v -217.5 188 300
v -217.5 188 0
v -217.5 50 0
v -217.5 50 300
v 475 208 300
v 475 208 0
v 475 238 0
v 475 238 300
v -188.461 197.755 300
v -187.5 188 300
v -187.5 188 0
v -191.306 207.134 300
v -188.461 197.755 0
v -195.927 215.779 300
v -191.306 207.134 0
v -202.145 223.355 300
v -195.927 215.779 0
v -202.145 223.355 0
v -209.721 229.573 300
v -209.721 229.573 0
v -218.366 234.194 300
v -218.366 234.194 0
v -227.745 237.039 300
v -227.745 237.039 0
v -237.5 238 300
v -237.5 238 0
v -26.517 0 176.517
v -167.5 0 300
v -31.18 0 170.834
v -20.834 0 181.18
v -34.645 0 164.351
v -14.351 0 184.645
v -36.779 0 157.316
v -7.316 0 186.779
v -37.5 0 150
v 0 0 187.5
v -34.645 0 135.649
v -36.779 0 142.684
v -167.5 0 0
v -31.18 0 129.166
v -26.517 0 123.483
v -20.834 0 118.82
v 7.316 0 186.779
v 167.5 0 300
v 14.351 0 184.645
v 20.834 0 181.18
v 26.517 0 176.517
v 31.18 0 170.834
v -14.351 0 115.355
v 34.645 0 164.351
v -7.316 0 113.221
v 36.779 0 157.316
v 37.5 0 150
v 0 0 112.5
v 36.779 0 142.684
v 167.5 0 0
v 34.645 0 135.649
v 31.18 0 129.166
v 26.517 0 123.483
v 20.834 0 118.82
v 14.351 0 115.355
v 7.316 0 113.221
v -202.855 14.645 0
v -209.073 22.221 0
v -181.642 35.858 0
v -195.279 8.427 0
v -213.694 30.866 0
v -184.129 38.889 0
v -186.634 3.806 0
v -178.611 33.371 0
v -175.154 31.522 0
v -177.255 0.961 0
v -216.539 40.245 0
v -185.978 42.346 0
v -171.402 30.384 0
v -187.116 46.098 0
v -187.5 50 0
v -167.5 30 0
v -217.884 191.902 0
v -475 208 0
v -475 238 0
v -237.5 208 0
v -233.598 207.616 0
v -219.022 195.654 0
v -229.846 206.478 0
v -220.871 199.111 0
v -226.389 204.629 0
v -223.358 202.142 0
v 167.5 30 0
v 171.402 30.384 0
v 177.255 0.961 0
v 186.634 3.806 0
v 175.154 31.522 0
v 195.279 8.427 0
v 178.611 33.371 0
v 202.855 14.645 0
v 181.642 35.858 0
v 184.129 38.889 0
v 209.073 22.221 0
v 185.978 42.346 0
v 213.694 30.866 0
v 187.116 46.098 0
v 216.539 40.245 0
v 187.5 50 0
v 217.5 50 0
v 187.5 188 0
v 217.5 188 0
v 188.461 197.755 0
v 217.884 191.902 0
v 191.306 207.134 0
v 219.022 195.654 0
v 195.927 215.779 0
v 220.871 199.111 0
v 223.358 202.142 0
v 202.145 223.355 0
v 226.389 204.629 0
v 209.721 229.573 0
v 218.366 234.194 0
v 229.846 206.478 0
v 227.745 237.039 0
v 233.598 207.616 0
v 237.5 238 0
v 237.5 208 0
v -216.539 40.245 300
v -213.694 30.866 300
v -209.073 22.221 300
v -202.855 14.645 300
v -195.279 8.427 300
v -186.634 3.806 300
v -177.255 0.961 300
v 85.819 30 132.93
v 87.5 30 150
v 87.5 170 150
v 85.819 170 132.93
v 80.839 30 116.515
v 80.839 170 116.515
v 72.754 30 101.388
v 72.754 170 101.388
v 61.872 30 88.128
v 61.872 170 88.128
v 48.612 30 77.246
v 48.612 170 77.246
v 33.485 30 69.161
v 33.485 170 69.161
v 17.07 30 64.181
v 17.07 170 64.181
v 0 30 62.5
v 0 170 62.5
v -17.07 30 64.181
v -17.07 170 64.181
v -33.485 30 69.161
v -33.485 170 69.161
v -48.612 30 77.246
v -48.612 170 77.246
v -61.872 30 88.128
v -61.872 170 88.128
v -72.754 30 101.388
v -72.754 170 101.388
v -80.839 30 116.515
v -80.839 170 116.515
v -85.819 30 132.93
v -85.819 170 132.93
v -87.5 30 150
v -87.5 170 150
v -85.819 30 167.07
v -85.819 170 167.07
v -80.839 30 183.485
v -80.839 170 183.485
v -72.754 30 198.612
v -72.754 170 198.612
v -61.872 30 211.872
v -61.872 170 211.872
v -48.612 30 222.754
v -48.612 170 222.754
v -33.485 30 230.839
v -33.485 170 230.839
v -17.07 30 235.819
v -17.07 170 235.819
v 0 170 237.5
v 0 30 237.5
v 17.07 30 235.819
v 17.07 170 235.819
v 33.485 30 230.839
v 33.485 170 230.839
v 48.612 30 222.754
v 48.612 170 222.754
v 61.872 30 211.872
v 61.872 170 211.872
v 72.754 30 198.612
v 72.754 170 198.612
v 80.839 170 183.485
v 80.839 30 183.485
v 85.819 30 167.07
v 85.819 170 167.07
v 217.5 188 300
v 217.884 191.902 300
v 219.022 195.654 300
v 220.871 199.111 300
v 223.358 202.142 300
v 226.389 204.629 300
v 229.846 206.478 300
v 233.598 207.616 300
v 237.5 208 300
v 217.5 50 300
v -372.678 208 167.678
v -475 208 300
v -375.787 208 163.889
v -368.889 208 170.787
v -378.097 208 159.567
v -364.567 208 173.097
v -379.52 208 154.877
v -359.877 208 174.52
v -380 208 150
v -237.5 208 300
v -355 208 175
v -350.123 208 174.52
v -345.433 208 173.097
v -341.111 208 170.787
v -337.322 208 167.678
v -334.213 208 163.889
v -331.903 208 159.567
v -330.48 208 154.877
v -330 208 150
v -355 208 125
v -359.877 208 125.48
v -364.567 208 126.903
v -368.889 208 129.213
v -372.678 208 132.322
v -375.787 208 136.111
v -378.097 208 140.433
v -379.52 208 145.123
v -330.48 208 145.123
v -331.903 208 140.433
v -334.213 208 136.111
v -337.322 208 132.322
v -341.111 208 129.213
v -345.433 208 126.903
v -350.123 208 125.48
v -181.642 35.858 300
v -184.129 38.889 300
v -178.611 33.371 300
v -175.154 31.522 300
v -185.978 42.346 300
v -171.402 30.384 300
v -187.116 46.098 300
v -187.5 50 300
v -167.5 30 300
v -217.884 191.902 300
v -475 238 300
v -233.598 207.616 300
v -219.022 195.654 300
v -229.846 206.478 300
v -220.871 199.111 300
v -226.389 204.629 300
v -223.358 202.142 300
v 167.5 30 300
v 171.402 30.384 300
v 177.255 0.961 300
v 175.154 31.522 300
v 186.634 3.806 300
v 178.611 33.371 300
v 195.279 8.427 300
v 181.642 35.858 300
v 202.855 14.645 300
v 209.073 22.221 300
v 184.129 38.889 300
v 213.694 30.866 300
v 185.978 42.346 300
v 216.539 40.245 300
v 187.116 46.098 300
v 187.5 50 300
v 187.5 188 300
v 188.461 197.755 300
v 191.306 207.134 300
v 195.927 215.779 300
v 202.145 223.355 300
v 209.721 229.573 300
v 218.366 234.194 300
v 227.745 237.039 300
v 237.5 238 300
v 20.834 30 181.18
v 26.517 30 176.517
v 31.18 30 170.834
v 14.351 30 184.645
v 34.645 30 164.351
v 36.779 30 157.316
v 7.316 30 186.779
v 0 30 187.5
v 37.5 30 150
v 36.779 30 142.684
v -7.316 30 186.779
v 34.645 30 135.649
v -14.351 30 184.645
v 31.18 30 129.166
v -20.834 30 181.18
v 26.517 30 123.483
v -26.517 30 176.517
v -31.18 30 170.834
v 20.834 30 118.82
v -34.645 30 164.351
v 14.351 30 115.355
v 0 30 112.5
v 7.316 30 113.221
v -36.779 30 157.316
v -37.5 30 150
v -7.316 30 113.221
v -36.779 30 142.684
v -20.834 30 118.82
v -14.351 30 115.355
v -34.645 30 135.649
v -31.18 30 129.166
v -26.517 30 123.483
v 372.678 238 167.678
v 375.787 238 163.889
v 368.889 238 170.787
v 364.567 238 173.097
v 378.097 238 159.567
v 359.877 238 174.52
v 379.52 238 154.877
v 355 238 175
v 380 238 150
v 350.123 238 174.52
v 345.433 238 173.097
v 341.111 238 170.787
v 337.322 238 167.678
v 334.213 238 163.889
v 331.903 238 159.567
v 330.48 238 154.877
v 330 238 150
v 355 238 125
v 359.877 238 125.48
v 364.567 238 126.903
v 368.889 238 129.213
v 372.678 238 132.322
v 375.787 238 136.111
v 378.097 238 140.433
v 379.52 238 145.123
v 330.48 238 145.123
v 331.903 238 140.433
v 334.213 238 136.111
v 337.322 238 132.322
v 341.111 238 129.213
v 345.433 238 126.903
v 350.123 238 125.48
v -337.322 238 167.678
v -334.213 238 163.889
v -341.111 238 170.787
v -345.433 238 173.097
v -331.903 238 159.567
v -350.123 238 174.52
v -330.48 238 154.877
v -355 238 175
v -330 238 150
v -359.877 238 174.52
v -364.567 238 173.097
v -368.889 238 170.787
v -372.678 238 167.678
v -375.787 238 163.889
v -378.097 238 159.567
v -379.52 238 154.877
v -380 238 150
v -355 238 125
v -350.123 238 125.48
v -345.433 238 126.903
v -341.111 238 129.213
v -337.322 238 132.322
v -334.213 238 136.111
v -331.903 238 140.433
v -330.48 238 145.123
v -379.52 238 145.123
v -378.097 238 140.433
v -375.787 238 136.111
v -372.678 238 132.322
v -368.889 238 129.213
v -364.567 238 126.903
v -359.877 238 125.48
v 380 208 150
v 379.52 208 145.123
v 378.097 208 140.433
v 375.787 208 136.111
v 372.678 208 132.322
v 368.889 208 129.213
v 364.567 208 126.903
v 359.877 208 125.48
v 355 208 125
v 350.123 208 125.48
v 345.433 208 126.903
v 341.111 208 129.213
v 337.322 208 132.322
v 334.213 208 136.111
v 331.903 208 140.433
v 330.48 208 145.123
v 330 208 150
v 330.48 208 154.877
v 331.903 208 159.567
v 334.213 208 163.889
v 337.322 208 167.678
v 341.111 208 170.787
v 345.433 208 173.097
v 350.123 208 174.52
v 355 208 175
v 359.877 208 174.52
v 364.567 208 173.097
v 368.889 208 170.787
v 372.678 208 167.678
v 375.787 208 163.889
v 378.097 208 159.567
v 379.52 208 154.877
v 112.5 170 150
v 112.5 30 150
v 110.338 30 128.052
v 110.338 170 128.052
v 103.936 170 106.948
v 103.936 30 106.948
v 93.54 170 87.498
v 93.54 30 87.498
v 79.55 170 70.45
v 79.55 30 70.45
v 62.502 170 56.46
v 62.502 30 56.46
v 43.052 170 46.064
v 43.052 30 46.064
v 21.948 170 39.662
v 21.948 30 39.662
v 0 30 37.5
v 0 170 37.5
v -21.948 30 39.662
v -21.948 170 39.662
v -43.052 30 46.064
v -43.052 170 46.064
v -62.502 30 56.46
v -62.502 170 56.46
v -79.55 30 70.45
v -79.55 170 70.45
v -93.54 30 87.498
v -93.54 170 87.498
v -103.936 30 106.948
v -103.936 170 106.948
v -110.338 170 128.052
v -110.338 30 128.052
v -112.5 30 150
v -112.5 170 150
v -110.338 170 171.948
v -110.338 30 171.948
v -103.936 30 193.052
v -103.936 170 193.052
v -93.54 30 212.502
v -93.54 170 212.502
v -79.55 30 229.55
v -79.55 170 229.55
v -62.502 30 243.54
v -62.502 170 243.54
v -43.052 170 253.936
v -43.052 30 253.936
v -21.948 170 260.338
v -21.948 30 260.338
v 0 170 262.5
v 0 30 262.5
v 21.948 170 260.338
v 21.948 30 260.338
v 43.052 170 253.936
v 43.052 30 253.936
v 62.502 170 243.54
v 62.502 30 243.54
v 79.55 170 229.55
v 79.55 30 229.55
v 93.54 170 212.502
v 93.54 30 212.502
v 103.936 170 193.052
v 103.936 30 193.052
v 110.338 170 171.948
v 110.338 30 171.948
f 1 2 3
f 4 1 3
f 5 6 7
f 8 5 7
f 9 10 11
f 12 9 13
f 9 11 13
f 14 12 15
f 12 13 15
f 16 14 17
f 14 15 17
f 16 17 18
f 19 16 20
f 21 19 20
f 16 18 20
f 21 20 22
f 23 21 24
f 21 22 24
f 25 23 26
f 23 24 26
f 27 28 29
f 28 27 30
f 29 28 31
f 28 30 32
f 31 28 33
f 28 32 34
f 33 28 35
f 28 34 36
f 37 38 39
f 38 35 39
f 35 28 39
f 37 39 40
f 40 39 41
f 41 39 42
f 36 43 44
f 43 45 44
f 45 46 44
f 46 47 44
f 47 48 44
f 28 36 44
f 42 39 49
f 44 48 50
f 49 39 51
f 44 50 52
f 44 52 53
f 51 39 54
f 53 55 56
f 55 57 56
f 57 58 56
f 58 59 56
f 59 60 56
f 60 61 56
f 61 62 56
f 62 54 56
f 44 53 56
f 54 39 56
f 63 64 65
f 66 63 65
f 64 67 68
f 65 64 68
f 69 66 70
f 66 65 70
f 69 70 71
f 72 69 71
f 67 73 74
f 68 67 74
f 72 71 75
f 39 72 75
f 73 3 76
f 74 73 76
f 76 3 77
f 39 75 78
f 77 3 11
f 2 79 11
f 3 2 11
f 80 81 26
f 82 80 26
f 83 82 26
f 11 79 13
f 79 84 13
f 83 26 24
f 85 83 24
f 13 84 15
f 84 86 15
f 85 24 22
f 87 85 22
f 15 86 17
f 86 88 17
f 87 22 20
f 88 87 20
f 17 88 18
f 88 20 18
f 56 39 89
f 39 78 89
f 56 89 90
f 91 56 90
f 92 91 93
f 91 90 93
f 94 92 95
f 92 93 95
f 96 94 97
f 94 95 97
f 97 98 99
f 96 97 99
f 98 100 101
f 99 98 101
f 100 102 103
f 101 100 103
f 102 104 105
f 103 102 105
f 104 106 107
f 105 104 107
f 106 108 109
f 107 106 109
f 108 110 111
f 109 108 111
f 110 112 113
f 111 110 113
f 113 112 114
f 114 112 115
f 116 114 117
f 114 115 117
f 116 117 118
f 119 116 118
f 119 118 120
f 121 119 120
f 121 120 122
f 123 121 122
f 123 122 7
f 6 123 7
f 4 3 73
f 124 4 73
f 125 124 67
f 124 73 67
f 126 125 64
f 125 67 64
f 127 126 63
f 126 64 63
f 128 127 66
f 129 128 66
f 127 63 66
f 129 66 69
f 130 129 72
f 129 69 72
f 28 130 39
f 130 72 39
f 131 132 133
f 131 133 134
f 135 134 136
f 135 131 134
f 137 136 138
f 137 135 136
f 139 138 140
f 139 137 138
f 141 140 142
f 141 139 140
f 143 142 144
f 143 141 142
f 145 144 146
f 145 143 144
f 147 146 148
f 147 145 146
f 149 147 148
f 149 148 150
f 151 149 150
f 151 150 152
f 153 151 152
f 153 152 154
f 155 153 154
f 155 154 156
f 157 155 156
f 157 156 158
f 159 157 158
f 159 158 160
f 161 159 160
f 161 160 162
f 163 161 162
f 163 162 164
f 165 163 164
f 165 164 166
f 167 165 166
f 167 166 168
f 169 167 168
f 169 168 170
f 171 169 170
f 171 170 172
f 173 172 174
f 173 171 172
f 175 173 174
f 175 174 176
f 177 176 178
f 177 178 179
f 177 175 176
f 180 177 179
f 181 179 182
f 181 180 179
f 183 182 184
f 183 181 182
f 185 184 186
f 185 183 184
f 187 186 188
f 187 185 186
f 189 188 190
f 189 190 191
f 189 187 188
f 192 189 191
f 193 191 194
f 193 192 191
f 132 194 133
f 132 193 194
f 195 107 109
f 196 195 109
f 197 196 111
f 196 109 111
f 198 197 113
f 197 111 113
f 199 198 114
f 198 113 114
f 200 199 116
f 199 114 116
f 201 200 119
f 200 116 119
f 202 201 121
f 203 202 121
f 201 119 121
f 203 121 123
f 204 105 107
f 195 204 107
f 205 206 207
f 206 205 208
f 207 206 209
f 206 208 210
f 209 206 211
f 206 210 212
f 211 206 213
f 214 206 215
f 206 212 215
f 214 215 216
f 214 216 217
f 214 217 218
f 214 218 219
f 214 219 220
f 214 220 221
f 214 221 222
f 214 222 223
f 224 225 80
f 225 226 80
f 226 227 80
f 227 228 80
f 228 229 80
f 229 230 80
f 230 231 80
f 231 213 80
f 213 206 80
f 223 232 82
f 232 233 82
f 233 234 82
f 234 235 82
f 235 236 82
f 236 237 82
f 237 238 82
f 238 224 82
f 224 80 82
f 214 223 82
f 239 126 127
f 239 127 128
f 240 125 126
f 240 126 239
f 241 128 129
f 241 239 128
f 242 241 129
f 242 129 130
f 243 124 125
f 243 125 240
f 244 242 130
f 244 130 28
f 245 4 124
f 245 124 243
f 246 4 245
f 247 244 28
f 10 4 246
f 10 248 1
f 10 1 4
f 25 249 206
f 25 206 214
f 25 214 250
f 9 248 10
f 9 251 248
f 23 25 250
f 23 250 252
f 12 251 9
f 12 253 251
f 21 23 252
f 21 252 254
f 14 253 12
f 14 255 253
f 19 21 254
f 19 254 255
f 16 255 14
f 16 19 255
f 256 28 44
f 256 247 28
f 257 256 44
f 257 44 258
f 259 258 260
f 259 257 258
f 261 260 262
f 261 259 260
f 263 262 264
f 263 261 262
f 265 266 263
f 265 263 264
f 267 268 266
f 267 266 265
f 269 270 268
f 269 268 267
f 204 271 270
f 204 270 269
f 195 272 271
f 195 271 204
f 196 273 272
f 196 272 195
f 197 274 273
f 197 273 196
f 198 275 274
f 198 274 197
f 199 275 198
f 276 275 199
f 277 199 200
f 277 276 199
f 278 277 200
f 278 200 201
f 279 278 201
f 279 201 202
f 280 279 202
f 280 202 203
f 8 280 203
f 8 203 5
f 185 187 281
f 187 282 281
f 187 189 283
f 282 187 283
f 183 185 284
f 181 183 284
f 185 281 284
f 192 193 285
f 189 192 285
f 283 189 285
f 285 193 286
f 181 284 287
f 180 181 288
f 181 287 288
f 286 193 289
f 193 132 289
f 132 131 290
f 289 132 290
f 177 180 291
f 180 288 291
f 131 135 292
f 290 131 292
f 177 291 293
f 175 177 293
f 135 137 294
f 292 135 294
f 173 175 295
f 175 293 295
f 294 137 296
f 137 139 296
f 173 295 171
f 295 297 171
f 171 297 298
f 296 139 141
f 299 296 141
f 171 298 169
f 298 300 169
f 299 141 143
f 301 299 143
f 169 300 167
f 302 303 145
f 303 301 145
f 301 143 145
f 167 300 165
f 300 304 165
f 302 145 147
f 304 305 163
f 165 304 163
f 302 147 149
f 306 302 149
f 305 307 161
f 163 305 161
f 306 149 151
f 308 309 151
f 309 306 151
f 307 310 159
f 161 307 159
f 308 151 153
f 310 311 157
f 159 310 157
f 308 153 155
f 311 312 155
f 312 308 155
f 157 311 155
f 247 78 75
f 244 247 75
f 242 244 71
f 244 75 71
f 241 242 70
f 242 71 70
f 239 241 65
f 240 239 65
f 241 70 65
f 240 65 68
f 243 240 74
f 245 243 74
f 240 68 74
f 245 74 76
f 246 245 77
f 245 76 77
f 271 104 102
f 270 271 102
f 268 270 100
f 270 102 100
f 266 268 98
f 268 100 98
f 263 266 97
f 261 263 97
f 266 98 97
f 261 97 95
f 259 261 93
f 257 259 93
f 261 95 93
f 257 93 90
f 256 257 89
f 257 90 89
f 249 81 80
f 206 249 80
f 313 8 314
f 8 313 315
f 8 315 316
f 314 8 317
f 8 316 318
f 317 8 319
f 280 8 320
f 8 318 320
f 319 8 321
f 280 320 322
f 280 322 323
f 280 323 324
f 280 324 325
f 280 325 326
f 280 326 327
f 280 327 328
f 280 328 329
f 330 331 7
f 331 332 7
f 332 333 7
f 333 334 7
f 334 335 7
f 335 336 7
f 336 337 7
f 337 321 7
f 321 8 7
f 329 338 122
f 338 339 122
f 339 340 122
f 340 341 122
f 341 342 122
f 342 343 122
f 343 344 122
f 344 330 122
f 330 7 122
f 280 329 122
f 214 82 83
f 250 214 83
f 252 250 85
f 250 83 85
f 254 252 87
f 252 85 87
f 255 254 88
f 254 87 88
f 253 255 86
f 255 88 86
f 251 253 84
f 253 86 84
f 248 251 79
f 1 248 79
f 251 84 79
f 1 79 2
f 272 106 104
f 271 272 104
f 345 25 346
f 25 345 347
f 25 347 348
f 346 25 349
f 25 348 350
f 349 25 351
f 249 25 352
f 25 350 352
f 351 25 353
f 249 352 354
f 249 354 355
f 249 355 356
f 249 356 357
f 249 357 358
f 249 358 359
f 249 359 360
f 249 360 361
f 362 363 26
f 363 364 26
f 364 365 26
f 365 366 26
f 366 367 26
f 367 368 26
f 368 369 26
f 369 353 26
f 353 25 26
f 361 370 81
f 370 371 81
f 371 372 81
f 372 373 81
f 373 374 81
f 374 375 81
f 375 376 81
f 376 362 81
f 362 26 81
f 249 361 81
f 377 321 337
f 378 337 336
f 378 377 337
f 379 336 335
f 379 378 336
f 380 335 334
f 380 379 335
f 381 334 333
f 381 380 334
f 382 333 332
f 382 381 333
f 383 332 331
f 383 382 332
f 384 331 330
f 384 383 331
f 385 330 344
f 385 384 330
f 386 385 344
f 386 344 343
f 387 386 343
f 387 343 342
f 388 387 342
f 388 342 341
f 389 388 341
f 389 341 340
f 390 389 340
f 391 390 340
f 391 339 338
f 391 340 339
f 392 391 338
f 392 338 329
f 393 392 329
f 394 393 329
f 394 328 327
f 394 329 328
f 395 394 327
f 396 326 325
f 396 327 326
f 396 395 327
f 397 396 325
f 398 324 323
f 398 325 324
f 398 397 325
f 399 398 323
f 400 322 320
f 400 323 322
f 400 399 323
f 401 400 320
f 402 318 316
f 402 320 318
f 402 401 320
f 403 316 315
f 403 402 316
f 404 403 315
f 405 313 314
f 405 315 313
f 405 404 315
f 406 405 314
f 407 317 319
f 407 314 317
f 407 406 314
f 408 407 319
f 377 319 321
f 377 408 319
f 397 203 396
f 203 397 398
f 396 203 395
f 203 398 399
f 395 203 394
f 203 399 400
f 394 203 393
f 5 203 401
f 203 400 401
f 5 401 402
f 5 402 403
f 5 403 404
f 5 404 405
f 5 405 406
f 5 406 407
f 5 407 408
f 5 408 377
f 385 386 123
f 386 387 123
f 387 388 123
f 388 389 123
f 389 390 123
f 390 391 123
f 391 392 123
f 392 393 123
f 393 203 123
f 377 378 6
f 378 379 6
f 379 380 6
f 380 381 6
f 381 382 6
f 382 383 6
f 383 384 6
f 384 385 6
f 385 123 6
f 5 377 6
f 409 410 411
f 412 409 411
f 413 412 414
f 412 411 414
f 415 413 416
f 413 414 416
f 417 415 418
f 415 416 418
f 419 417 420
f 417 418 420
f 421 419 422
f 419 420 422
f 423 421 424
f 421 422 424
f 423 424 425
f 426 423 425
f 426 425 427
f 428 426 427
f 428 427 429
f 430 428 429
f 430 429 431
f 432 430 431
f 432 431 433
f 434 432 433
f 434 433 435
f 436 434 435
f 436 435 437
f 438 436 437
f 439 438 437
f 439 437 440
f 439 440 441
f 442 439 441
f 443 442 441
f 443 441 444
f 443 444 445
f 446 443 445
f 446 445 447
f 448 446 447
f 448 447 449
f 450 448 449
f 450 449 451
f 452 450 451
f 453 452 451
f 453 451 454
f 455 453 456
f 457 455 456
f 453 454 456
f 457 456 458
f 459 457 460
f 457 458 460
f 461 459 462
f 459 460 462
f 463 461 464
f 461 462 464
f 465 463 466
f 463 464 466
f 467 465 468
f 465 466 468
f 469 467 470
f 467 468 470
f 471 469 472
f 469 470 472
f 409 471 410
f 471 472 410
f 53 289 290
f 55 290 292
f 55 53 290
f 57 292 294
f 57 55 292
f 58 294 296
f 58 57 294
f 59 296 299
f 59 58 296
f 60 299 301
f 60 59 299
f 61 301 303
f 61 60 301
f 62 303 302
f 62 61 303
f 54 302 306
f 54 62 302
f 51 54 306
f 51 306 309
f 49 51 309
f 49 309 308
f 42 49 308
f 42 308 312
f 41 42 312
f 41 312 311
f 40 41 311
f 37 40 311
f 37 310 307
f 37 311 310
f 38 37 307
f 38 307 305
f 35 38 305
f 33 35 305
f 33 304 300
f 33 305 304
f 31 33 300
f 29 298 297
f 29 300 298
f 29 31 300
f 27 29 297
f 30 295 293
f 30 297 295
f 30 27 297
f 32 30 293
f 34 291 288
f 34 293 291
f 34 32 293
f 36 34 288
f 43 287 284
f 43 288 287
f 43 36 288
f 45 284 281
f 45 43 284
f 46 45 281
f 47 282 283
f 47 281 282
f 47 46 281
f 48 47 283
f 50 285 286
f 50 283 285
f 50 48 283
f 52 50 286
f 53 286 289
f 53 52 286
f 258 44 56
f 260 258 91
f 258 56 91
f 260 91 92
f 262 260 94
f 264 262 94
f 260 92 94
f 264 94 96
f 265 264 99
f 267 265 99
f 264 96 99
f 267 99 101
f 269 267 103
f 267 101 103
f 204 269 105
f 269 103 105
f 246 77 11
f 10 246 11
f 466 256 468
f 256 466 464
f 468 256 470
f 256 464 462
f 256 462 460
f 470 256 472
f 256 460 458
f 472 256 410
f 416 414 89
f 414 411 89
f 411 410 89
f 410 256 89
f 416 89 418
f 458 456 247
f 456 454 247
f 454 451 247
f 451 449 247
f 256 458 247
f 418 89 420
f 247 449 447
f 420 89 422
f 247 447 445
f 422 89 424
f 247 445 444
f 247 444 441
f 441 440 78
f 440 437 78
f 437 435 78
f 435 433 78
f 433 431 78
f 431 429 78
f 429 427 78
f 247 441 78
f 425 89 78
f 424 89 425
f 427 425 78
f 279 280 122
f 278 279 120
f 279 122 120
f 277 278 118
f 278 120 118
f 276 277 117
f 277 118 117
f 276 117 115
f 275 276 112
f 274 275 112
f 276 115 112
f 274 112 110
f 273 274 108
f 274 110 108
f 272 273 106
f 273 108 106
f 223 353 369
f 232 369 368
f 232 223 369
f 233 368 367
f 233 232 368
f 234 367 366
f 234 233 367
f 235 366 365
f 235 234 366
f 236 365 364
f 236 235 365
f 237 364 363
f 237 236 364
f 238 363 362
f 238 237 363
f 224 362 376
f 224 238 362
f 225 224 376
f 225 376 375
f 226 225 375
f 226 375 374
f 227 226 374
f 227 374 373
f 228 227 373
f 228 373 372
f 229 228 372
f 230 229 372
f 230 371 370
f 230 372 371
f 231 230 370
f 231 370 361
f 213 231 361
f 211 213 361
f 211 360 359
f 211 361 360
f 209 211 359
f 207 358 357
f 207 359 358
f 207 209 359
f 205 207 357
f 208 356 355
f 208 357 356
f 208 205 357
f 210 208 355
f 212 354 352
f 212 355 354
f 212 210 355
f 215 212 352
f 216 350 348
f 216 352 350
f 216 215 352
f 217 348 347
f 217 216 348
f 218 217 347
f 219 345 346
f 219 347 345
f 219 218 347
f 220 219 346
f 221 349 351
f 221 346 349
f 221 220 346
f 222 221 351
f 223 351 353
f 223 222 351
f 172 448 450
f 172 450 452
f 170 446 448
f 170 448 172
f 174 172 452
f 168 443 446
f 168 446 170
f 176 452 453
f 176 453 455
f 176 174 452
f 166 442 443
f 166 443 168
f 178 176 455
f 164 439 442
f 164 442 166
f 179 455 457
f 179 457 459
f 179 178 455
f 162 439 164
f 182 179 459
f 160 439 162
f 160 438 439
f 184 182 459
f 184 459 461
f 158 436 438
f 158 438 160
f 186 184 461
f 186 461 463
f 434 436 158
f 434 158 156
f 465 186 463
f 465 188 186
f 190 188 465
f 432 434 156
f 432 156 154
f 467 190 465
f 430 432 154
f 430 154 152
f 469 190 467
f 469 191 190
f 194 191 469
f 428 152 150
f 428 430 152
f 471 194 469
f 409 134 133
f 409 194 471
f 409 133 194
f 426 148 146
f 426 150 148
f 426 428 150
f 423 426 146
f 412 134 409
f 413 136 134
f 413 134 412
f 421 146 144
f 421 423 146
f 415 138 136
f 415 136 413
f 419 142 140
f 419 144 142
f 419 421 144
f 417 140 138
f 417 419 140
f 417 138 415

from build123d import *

# Parameters (mm, degrees)
BOSS_EXTRUDE1_DEPTH = 300
SKETCH2_R           = 112.5
SKETCH2_R_2         = 87.5
BOSS_EXTRUDE2_DEPTH = 170
SKETCH3_R           = 37.5
CUT_EXTRUDE3_DEPTH  = 239
CUT_EXTRUDE4_START  = 208
SKETCH5_R           = 25
CUT_EXTRUDE4_DEPTH  = 31


with BuildPart() as part:
    # Sketch1 → Boss-Extrude1 (new body)
    with BuildSketch(Plane.XY):
        with BuildLine():
            Line((-167.5, 0), (167.5, 0))
            ThreePointArc((167.5, 0), (202.855339059, 14.644660941), (217.5, 50))
            Line((217.5, 50), (217.5, 188))
            ThreePointArc((217.5, 188), (223.357864376, 202.142135624), (237.5, 208))
            Line((237.5, 208), (475, 208))
            Line((475, 208), (475, 238))
            Line((475, 238), (237.5, 238))
            ThreePointArc((237.5, 238), (202.144660941, 223.355339059), (187.5, 188))
            Line((187.5, 188), (187.5, 50))
            ThreePointArc((187.5, 50), (181.642135624, 35.857864376), (167.5, 30))
            Line((167.5, 30), (-167.5, 30))
            ThreePointArc((-167.5, 30), (-181.642135624, 35.857864376), (-187.5, 50))
            Line((-187.5, 50), (-187.5, 188))
            ThreePointArc((-187.5, 188), (-202.144660941, 223.355339059), (-237.5, 238))
            Line((-237.5, 238), (-475, 238))
            Line((-475, 238), (-475, 208))
            Line((-475, 208), (-237.5, 208))
            ThreePointArc((-237.5, 208), (-223.357864376, 202.142135624), (-217.5, 188))
            Line((-217.5, 188), (-217.5, 50))
            ThreePointArc((-217.5, 50), (-202.855339059, 14.644660941), (-167.5, 0))
        make_face()
    extrude(amount=BOSS_EXTRUDE1_DEPTH)

    # Sketch2 → Boss-Extrude2 (add)
    with BuildSketch(Plane(origin=(0, 0, 0), x_dir=(1, 0, 0), z_dir=(0, 1, 0))):
        with Locations((0, -150)):
            Circle(SKETCH2_R)
        with Locations((0, -150)):
            Circle(SKETCH2_R_2, mode=Mode.SUBTRACT)
    extrude(amount=BOSS_EXTRUDE2_DEPTH)

    # Sketch3 → Cut-Extrude3 (cut, through all)
    with BuildSketch(Plane(origin=(0, 0, 0), x_dir=(1, 0, 0), z_dir=(0, 1, 0))):
        with Locations((0, -150)):
            Circle(SKETCH3_R)
    extrude(amount=CUT_EXTRUDE3_DEPTH, mode=Mode.SUBTRACT)

    # Sketch5 → Cut-Extrude4 (cut, through all)
    with BuildSketch(Plane(origin=(0, 0, 0), x_dir=(1, 0, 0), z_dir=(0, 1, 0)).offset(CUT_EXTRUDE4_START)):
        with Locations((-355, -150)):
            Circle(SKETCH5_R)
        with Locations((355, -150)):
            Circle(SKETCH5_R)
    extrude(amount=CUT_EXTRUDE4_DEPTH, mode=Mode.SUBTRACT)


solid = part.part
